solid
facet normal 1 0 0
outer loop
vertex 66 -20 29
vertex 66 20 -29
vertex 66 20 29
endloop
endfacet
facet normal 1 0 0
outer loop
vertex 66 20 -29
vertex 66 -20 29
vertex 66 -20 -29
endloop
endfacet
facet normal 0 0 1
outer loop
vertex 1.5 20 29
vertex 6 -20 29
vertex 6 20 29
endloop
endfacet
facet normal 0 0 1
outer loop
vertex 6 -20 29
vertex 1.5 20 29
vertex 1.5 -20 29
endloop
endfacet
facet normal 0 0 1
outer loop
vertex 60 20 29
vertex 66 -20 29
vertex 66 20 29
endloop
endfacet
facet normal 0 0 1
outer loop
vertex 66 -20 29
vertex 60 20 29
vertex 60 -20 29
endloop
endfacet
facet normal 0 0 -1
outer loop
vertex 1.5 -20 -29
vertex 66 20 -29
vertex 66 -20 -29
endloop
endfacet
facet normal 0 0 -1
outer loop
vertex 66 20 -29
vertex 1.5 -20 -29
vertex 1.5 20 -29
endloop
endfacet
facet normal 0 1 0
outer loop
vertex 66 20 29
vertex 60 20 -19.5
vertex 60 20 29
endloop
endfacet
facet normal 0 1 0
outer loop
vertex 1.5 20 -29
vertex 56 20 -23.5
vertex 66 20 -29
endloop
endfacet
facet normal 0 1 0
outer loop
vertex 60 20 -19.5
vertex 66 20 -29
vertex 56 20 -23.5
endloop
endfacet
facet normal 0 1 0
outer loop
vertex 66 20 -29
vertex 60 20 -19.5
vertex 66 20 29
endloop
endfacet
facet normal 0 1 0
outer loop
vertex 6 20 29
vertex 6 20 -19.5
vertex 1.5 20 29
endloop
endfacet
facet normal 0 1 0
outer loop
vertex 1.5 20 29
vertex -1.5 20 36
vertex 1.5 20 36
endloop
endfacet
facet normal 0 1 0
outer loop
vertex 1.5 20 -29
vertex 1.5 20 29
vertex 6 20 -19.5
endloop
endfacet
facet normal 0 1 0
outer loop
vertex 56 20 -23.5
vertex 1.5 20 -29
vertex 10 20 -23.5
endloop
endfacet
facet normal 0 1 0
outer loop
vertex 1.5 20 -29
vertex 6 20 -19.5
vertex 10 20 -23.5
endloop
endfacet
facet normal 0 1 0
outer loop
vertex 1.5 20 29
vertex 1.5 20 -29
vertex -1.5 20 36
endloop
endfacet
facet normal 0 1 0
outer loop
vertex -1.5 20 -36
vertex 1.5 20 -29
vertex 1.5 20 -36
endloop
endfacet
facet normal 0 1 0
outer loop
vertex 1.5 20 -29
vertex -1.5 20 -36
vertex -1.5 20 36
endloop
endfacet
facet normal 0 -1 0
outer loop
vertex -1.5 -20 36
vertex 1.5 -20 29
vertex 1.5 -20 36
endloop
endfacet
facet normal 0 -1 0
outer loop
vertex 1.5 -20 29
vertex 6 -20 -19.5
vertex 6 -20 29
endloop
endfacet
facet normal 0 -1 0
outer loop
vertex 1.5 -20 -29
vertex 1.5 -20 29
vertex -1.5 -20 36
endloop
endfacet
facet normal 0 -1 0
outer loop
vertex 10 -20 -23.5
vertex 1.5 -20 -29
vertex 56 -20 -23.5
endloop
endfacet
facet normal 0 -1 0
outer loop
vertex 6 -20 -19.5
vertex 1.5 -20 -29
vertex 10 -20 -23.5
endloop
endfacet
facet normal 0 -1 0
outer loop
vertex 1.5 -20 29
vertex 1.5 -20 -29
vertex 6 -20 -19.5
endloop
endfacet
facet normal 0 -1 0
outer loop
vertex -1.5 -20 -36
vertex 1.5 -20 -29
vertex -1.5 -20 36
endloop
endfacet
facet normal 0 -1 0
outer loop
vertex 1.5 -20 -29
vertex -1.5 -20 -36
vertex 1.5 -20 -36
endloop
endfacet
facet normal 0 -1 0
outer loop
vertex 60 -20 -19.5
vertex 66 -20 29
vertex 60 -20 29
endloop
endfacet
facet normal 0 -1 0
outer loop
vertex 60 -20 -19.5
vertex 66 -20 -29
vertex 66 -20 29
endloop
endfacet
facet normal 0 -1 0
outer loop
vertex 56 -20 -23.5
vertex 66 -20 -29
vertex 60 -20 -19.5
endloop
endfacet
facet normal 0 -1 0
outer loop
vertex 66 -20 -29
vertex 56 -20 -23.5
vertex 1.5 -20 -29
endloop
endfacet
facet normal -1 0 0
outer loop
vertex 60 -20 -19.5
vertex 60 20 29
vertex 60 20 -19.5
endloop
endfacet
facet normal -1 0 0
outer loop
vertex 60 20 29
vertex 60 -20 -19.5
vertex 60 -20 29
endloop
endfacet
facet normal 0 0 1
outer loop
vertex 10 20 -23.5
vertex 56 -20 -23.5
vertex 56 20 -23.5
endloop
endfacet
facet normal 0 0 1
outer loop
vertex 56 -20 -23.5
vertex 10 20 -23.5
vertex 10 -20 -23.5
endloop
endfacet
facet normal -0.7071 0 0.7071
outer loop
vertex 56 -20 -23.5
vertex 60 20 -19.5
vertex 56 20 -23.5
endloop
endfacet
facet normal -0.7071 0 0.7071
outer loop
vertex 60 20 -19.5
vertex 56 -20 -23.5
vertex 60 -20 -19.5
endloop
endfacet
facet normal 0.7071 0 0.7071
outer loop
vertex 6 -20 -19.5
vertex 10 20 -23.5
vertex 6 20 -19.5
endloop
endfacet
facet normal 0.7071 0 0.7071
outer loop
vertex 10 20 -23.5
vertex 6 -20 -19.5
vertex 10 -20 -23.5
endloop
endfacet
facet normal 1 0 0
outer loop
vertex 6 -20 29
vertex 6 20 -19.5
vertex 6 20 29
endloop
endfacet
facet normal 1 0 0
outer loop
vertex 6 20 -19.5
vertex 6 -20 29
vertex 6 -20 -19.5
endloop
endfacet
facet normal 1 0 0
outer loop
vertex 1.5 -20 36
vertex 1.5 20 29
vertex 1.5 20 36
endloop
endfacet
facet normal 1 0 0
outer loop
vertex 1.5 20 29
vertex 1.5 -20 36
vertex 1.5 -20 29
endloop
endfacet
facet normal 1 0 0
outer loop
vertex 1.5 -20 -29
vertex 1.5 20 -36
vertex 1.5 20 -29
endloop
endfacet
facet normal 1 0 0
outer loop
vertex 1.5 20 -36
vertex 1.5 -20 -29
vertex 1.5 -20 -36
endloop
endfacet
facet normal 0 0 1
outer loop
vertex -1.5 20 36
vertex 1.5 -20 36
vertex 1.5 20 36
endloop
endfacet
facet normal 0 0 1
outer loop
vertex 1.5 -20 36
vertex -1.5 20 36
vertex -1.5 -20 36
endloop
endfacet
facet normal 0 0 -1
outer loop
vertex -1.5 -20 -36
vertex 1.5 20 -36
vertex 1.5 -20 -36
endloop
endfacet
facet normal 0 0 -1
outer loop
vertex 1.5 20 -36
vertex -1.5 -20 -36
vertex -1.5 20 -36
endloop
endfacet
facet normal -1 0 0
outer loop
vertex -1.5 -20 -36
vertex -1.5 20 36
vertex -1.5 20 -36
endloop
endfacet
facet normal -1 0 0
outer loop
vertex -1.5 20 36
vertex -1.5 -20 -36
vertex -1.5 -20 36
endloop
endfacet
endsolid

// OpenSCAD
module wallHanger(width, height, thin){
    cube(size=[thin,width,height], center = true);
}

module gunHanger(width, height, thin,diff,deltax=4,deltaz=4){
    difference(){
        cube(size=[thin+diff,width,height+diff/2],center=true);        
        translate([0,0,diff/4]){
            polyhedron
    (points = [
	       [-thin/2+deltax, -(width+1)/2, -(height+1)/2], [-thin/2+deltax, (width+1)/2, -(height+1)/2],[thin/2-deltax, -(width+1)/2, -(height+1)/2],[thin/2-deltax, (width+1)/2, -(height+1)/2],[-thin/2, -(width+1)/2, (height+1)/2], [-thin/2, (width+1)/2, (height+1)/2],[thin/2, -(width+1)/2, (height+1)/2],[thin/2, (width+1)/2, (height+1)/2],
        
        [-thin/2, -(width+1)/2, -(height+1)/2+deltaz], [-thin/2, (width+1)/2, -(height+1)/2+deltaz],[thin/2, -(width+1)/2, -(height+1)/2+deltaz],[thin/2, (width+1)/2, -(height+1)/2+deltaz]
	       ], 
     faces = [
		  [1,0,2],
        [1,2,3],
        [4,5,6],
        [6,5,7],
        [8,4,6],
        [10,8,6],
        [5,9,7],
        [9,11,7],
        [9,5,4],
        [8,9,4],  
        [10,6,11],
        [6,7,11],
        [0,1,8],
        [8,1,9],
        [3,2,10],
        [10,11,3],
        [0,8,2],
        [2,8,10],
        [1,3,9],  
        [9,3,11]
		  ]);
      }
    }
}

diff = 12;
height = 40+diff;
width = 40;
thin=12*2+30;
wallHanger(width,height+20,3);
translate([(thin+diff)/2,0,0]){
    gunHanger(width,height,thin,diff);
}
